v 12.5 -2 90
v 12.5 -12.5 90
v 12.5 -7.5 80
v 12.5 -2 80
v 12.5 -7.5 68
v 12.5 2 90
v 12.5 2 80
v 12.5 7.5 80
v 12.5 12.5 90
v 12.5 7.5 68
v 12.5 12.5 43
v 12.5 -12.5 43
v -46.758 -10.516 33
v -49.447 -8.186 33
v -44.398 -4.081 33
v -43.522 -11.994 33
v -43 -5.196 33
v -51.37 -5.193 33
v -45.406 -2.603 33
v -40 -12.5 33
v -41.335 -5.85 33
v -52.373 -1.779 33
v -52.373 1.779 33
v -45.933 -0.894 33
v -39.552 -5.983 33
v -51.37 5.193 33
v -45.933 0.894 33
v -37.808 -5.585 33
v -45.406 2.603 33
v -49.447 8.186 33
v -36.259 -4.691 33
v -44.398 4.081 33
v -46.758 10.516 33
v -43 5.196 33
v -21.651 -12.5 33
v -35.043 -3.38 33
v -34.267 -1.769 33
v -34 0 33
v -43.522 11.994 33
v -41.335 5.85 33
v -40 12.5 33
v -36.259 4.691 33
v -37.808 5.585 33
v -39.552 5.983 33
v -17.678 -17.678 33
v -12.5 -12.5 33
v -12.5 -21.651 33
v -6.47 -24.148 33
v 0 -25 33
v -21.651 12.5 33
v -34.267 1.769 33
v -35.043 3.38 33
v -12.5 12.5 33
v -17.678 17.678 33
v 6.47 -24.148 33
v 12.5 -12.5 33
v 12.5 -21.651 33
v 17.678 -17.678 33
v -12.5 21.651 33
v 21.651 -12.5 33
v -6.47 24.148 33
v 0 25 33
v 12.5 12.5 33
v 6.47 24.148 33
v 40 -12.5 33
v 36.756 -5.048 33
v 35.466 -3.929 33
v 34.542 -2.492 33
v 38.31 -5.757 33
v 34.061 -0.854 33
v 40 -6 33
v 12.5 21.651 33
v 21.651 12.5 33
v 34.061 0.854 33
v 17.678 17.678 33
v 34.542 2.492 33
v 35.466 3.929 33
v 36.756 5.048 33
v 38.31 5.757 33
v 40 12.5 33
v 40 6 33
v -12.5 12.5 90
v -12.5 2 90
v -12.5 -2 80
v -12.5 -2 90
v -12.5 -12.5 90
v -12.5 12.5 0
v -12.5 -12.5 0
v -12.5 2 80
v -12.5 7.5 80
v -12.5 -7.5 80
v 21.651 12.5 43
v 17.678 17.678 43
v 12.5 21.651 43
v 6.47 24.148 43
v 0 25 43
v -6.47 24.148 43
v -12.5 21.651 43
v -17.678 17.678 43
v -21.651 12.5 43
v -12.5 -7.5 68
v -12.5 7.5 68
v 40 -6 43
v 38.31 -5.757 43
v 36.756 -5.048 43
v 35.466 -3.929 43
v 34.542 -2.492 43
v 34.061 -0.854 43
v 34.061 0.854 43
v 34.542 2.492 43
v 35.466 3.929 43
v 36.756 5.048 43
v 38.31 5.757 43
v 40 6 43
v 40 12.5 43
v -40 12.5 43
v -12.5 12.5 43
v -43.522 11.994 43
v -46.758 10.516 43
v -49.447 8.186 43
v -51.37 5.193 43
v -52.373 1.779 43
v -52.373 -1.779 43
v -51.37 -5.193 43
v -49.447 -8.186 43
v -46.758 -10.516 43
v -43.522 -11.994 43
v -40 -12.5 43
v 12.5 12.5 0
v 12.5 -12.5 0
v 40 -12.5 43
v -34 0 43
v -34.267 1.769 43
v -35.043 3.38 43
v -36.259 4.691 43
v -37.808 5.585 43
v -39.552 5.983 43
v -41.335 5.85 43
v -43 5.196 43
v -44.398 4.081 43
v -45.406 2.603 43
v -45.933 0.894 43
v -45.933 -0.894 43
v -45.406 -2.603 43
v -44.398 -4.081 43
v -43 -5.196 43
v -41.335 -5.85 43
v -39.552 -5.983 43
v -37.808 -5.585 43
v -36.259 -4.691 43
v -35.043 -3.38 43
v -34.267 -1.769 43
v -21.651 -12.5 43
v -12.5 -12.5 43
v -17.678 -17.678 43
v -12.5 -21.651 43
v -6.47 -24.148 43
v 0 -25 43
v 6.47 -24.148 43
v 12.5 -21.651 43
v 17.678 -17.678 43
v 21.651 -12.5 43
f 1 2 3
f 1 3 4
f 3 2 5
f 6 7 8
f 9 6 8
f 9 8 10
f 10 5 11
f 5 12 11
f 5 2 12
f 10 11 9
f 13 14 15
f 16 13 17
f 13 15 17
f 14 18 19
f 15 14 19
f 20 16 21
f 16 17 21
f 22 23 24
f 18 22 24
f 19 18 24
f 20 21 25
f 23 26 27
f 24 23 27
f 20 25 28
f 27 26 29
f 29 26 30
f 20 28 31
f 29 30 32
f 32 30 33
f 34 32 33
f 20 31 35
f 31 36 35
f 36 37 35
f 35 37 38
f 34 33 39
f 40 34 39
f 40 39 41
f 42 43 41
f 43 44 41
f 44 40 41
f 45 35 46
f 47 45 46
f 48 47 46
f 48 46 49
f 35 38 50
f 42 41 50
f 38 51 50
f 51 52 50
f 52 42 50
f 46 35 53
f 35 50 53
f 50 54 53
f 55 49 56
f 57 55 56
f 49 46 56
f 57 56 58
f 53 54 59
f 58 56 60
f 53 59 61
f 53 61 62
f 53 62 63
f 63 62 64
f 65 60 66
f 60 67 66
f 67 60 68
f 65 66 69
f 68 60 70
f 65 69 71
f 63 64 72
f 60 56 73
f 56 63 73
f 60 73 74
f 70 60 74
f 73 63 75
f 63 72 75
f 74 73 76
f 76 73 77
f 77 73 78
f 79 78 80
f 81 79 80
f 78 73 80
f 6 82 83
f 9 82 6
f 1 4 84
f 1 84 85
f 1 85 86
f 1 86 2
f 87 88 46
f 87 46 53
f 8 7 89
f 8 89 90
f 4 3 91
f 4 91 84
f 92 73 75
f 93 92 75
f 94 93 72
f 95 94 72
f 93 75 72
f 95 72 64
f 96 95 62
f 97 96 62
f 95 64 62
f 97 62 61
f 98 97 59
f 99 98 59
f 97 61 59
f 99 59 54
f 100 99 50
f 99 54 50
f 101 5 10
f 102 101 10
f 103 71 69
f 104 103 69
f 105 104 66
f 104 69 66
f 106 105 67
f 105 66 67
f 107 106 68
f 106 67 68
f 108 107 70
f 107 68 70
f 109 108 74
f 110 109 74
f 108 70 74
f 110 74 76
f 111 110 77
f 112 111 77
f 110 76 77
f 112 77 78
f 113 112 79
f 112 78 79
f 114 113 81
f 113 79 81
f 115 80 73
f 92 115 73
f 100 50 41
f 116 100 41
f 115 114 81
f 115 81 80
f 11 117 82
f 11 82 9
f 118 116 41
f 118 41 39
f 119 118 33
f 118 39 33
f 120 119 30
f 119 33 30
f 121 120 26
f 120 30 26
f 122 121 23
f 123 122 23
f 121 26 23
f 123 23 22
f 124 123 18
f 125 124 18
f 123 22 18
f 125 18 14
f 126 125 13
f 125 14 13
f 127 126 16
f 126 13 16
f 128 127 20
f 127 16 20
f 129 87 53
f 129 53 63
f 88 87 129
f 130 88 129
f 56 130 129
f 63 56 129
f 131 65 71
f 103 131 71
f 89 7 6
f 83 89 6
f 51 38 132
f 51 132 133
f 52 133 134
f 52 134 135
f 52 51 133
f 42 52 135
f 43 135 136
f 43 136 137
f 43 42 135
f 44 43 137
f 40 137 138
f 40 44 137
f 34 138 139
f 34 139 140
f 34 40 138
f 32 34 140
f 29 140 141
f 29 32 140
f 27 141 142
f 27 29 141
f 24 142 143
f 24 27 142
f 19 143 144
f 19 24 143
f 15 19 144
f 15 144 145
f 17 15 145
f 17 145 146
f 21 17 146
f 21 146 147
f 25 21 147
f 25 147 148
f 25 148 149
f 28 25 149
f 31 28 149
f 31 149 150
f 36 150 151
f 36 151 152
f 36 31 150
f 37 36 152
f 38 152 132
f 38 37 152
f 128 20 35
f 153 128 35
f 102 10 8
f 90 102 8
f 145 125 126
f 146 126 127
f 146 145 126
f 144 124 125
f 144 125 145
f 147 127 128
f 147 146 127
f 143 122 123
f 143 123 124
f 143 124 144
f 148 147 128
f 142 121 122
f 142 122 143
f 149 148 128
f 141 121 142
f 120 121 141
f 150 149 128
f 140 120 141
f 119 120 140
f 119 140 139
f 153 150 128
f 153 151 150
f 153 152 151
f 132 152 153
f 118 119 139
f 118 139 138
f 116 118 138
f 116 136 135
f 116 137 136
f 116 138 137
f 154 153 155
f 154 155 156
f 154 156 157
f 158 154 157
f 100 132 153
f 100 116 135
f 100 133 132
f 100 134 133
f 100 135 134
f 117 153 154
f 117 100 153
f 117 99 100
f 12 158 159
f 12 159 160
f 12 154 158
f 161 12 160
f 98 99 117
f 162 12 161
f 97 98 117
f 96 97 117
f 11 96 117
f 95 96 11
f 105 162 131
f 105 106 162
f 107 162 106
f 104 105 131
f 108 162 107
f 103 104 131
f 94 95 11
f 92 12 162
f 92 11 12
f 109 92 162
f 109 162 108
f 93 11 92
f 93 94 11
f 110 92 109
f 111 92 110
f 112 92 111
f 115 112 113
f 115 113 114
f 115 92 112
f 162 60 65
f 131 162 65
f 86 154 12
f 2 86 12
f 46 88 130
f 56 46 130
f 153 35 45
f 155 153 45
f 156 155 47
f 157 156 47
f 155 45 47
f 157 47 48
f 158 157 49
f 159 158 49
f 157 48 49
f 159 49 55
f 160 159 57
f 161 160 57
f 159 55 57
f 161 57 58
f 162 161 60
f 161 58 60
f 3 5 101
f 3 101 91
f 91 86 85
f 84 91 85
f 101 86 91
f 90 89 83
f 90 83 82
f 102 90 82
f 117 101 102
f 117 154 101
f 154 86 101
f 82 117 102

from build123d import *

# Parameters (mm, degrees)
SKETCH_1_W          = 25
SKETCH_1_H          = 25
EXTRUDE_1_DEPTH     = 90
EXTRUDE_START       = 33
SKETCH_1_3_R        = 6
SKETCH_1_3_W        = 25
SKETCH_1_3_H        = 25
EXTRUDE_2_DEPTH     = 10
SKETCH_3_W          = 12
SKETCH_3_H          = 15
SKETCH_3_W_2        = 10
SKETCH_3_H_2        = 4
CUT_EXTRUDE_3_DEPTH = 114.798066767


with BuildPart() as part:
    # Эскиз1 → Бобышка-Вытянуть1 (new body)
    with BuildSketch(Plane.XY):
        Rectangle(SKETCH_1_W, SKETCH_1_H)
    extrude(amount=EXTRUDE_1_DEPTH)

    # Эскиз1<3> → Бобышка-Вытянуть2 (add)
    with BuildSketch(Plane.XY.offset(EXTRUDE_START)):
        with BuildLine():
            Line((-21.650635095, 12.5), (-40, 12.5))
            ThreePointArc((-40, 12.5), (-52.5, 0), (-40, -12.5))
            Line((-40, -12.5), (-21.650635095, -12.5))
            ThreePointArc((-21.650635095, -12.5), (0, -25), (21.650635095, -12.5))
            Line((21.650635095, -12.5), (40, -12.5))
            Line((40, -12.5), (40, -6))
            ThreePointArc((40, -6), (34, 0), (40, 6))
            Line((40, 6), (40, 12.5))
            Line((40, 12.5), (21.650635095, 12.5))
            ThreePointArc((21.650635095, 12.5), (0, 25), (-21.650635095, 12.5))
        make_face()
        with Locations((-40, 0)):
            Circle(SKETCH_1_3_R, mode=Mode.SUBTRACT)
        Rectangle(SKETCH_1_3_W, SKETCH_1_3_H, mode=Mode.SUBTRACT)
    extrude(amount=EXTRUDE_2_DEPTH)

    # Эскиз3 → Вырез-Вытянуть3 (cut, through all)
    with BuildSketch(Plane.ZY.offset(-12.5)):
        with Locations((74, 0)):
            Rectangle(SKETCH_3_W, SKETCH_3_H)
        with Locations((85, 0)):
            Rectangle(SKETCH_3_W_2, SKETCH_3_H_2)
    extrude(amount=CUT_EXTRUDE_3_DEPTH, mode=Mode.SUBTRACT)


solid = part.part
